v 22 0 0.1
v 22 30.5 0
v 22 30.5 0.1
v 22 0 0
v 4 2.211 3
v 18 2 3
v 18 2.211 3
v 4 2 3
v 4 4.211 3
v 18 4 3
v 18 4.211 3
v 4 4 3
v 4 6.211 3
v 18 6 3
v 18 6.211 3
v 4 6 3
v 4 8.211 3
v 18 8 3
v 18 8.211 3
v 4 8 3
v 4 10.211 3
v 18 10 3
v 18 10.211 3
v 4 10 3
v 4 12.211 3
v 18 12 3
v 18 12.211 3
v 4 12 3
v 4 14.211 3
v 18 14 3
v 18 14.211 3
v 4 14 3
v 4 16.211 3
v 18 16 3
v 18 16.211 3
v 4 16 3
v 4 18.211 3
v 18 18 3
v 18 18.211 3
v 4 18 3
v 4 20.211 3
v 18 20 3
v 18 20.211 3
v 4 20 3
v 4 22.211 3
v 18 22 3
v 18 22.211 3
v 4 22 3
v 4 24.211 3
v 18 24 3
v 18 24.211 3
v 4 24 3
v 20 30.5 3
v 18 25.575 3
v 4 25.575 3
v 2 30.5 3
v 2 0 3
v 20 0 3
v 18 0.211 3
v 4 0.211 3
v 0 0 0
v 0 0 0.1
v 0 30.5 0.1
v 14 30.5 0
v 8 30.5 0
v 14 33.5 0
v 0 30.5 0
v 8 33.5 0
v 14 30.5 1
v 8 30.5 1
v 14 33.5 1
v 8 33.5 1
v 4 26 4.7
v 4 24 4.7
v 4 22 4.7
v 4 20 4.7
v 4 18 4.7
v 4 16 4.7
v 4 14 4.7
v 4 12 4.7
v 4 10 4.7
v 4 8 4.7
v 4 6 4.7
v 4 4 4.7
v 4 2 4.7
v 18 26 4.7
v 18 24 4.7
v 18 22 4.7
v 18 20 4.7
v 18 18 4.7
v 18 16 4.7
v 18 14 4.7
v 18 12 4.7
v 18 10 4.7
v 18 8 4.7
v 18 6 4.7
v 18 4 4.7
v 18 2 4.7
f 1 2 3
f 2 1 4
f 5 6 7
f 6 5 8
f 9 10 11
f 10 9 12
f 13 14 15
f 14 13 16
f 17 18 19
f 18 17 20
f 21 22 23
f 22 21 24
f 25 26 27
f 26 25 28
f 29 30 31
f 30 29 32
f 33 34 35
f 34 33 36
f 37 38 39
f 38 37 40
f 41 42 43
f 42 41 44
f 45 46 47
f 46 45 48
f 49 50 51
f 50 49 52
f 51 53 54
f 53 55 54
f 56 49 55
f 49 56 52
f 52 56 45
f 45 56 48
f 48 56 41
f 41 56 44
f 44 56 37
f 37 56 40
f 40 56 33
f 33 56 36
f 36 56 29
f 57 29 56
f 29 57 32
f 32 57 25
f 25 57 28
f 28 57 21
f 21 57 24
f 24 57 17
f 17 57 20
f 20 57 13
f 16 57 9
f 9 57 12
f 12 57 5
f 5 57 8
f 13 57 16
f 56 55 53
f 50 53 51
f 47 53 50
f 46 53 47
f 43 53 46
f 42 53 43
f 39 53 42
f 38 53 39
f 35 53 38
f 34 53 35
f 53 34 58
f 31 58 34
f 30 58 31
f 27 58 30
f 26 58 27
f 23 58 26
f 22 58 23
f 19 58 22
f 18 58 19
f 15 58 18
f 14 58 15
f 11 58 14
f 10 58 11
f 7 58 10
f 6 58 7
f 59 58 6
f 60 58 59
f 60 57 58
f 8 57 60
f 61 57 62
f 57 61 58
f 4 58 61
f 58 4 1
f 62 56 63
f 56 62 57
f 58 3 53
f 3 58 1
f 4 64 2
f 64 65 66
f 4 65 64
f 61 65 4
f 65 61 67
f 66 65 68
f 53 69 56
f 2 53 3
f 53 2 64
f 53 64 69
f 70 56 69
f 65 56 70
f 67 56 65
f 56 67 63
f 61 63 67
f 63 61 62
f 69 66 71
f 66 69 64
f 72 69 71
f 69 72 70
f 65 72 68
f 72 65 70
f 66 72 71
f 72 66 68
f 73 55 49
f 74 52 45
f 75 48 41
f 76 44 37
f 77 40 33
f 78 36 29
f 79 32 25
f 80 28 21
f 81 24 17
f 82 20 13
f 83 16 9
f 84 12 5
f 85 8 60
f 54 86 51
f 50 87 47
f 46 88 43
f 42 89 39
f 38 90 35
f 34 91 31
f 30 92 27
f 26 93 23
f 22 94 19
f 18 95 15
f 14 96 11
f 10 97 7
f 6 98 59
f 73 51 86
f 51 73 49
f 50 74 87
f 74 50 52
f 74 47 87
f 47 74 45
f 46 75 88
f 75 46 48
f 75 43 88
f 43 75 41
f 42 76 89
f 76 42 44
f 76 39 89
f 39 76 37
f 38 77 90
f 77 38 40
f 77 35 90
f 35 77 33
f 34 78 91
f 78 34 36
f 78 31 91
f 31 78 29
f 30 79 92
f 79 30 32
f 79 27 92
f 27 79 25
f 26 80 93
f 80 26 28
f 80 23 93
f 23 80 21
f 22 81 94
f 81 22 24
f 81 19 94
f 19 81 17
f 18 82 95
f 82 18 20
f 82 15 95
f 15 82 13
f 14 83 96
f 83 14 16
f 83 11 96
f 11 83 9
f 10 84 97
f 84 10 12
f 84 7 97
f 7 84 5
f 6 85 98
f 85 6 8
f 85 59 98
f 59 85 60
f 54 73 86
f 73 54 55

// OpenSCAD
// Cover assmebly for a battery or similar compartment. slide_cover_base
// should be included in the object, since it provides the rails to accpet
// the cover. slide_cover makes the actual lid.

// Part of the components library.

// By Nenad Rijavec
// Feel free to use, share, modify, etc. as you see fit.

do_build = 1 ;
bld_base = 0 ;
bld_cover = 1 ;
cover_w = 19 ;
cover_l = 27 ;
lid_h = 3 ;
tab_w = 6 ;

module slide_cover( cover_w, cover_l, lid_h  )
{
	// sliding plate
	hull() union() {
		cube( [ cover_w+4, cover_l, 0.1 ] ) ;
		translate( [ 2, 0, lid_h-0.1 ] ) 
		cube( [ cover_w, cover_l, 0.1 ] ) ;
	}
	// lock tab
	translate( [ 2+(cover_w-tab_w)/2, cover_l-1, 0 ] )
		cube( [ tab_w, 4, 1 ] ) ;
	// friction area for opening
	f_w = cover_w - 4 ;
	f_l = cover_l > 10 ? cover_l-5 : cover_l-2 ;

	pts = concat( 
		[ [0,0] ],
		[ for (i=[0:1:f_l])
			[for (j=[0:1])
				j==0 ? 
					(i+i%2) : (i%2==0?0.1:2)
		] ],
		[ [f_l,0]]
	) ;
	translate( [ 4, 0, lid_h-0.3 ] )
	rotate( [ 90, 0, 90 ] )
	linear_extrude( f_w ) polygon( pts ) ;


}

module slide_cover_base( cover_w, cover_l, lid_h )
{
	frame_w = 4 ;
	difference() {
		cube( [ cover_w + 2*frame_w, cover_l+2*frame_w, lid_h+1 ] ) ; 
		union() {
			translate( [ frame_w, frame_w-1, -1 ] )
				cube( [ cover_w, cover_l+2, lid_h+4 ] ) ;
			translate( [ frame_w-2.5, -1, 1 ] )
			slide_cover( cover_w+1, cover_l+frame_w+2, lid_h + 0.8 ) ;
			translate( [ frame_w+(cover_w-(tab_w+2))/2,
			frame_w+cover_l-1, 0.5 ] )
				cube( [ tab_w+2, 4.5, 2.1 ] ) ;
		}
	}
	
}

if ( do_build ) {
	if ( bld_cover )
		slide_cover( cover_w-1, cover_l+3.5, lid_h ) ;
	if ( bld_base ) 
		translate( [ bld_cover * (cover_w+5 ), 0, 0 ] )
			slide_cover_base( cover_w, cover_l, lid_h ) ;
			
} else {
	color("red")translate( [ 2.0, -0.1, 1.1 ] )
		slide_cover( cover_w, cover_l+3.5, lid_h ) ;
	slide_cover_base( cover_w, cover_l, lid_h ) ;
}
